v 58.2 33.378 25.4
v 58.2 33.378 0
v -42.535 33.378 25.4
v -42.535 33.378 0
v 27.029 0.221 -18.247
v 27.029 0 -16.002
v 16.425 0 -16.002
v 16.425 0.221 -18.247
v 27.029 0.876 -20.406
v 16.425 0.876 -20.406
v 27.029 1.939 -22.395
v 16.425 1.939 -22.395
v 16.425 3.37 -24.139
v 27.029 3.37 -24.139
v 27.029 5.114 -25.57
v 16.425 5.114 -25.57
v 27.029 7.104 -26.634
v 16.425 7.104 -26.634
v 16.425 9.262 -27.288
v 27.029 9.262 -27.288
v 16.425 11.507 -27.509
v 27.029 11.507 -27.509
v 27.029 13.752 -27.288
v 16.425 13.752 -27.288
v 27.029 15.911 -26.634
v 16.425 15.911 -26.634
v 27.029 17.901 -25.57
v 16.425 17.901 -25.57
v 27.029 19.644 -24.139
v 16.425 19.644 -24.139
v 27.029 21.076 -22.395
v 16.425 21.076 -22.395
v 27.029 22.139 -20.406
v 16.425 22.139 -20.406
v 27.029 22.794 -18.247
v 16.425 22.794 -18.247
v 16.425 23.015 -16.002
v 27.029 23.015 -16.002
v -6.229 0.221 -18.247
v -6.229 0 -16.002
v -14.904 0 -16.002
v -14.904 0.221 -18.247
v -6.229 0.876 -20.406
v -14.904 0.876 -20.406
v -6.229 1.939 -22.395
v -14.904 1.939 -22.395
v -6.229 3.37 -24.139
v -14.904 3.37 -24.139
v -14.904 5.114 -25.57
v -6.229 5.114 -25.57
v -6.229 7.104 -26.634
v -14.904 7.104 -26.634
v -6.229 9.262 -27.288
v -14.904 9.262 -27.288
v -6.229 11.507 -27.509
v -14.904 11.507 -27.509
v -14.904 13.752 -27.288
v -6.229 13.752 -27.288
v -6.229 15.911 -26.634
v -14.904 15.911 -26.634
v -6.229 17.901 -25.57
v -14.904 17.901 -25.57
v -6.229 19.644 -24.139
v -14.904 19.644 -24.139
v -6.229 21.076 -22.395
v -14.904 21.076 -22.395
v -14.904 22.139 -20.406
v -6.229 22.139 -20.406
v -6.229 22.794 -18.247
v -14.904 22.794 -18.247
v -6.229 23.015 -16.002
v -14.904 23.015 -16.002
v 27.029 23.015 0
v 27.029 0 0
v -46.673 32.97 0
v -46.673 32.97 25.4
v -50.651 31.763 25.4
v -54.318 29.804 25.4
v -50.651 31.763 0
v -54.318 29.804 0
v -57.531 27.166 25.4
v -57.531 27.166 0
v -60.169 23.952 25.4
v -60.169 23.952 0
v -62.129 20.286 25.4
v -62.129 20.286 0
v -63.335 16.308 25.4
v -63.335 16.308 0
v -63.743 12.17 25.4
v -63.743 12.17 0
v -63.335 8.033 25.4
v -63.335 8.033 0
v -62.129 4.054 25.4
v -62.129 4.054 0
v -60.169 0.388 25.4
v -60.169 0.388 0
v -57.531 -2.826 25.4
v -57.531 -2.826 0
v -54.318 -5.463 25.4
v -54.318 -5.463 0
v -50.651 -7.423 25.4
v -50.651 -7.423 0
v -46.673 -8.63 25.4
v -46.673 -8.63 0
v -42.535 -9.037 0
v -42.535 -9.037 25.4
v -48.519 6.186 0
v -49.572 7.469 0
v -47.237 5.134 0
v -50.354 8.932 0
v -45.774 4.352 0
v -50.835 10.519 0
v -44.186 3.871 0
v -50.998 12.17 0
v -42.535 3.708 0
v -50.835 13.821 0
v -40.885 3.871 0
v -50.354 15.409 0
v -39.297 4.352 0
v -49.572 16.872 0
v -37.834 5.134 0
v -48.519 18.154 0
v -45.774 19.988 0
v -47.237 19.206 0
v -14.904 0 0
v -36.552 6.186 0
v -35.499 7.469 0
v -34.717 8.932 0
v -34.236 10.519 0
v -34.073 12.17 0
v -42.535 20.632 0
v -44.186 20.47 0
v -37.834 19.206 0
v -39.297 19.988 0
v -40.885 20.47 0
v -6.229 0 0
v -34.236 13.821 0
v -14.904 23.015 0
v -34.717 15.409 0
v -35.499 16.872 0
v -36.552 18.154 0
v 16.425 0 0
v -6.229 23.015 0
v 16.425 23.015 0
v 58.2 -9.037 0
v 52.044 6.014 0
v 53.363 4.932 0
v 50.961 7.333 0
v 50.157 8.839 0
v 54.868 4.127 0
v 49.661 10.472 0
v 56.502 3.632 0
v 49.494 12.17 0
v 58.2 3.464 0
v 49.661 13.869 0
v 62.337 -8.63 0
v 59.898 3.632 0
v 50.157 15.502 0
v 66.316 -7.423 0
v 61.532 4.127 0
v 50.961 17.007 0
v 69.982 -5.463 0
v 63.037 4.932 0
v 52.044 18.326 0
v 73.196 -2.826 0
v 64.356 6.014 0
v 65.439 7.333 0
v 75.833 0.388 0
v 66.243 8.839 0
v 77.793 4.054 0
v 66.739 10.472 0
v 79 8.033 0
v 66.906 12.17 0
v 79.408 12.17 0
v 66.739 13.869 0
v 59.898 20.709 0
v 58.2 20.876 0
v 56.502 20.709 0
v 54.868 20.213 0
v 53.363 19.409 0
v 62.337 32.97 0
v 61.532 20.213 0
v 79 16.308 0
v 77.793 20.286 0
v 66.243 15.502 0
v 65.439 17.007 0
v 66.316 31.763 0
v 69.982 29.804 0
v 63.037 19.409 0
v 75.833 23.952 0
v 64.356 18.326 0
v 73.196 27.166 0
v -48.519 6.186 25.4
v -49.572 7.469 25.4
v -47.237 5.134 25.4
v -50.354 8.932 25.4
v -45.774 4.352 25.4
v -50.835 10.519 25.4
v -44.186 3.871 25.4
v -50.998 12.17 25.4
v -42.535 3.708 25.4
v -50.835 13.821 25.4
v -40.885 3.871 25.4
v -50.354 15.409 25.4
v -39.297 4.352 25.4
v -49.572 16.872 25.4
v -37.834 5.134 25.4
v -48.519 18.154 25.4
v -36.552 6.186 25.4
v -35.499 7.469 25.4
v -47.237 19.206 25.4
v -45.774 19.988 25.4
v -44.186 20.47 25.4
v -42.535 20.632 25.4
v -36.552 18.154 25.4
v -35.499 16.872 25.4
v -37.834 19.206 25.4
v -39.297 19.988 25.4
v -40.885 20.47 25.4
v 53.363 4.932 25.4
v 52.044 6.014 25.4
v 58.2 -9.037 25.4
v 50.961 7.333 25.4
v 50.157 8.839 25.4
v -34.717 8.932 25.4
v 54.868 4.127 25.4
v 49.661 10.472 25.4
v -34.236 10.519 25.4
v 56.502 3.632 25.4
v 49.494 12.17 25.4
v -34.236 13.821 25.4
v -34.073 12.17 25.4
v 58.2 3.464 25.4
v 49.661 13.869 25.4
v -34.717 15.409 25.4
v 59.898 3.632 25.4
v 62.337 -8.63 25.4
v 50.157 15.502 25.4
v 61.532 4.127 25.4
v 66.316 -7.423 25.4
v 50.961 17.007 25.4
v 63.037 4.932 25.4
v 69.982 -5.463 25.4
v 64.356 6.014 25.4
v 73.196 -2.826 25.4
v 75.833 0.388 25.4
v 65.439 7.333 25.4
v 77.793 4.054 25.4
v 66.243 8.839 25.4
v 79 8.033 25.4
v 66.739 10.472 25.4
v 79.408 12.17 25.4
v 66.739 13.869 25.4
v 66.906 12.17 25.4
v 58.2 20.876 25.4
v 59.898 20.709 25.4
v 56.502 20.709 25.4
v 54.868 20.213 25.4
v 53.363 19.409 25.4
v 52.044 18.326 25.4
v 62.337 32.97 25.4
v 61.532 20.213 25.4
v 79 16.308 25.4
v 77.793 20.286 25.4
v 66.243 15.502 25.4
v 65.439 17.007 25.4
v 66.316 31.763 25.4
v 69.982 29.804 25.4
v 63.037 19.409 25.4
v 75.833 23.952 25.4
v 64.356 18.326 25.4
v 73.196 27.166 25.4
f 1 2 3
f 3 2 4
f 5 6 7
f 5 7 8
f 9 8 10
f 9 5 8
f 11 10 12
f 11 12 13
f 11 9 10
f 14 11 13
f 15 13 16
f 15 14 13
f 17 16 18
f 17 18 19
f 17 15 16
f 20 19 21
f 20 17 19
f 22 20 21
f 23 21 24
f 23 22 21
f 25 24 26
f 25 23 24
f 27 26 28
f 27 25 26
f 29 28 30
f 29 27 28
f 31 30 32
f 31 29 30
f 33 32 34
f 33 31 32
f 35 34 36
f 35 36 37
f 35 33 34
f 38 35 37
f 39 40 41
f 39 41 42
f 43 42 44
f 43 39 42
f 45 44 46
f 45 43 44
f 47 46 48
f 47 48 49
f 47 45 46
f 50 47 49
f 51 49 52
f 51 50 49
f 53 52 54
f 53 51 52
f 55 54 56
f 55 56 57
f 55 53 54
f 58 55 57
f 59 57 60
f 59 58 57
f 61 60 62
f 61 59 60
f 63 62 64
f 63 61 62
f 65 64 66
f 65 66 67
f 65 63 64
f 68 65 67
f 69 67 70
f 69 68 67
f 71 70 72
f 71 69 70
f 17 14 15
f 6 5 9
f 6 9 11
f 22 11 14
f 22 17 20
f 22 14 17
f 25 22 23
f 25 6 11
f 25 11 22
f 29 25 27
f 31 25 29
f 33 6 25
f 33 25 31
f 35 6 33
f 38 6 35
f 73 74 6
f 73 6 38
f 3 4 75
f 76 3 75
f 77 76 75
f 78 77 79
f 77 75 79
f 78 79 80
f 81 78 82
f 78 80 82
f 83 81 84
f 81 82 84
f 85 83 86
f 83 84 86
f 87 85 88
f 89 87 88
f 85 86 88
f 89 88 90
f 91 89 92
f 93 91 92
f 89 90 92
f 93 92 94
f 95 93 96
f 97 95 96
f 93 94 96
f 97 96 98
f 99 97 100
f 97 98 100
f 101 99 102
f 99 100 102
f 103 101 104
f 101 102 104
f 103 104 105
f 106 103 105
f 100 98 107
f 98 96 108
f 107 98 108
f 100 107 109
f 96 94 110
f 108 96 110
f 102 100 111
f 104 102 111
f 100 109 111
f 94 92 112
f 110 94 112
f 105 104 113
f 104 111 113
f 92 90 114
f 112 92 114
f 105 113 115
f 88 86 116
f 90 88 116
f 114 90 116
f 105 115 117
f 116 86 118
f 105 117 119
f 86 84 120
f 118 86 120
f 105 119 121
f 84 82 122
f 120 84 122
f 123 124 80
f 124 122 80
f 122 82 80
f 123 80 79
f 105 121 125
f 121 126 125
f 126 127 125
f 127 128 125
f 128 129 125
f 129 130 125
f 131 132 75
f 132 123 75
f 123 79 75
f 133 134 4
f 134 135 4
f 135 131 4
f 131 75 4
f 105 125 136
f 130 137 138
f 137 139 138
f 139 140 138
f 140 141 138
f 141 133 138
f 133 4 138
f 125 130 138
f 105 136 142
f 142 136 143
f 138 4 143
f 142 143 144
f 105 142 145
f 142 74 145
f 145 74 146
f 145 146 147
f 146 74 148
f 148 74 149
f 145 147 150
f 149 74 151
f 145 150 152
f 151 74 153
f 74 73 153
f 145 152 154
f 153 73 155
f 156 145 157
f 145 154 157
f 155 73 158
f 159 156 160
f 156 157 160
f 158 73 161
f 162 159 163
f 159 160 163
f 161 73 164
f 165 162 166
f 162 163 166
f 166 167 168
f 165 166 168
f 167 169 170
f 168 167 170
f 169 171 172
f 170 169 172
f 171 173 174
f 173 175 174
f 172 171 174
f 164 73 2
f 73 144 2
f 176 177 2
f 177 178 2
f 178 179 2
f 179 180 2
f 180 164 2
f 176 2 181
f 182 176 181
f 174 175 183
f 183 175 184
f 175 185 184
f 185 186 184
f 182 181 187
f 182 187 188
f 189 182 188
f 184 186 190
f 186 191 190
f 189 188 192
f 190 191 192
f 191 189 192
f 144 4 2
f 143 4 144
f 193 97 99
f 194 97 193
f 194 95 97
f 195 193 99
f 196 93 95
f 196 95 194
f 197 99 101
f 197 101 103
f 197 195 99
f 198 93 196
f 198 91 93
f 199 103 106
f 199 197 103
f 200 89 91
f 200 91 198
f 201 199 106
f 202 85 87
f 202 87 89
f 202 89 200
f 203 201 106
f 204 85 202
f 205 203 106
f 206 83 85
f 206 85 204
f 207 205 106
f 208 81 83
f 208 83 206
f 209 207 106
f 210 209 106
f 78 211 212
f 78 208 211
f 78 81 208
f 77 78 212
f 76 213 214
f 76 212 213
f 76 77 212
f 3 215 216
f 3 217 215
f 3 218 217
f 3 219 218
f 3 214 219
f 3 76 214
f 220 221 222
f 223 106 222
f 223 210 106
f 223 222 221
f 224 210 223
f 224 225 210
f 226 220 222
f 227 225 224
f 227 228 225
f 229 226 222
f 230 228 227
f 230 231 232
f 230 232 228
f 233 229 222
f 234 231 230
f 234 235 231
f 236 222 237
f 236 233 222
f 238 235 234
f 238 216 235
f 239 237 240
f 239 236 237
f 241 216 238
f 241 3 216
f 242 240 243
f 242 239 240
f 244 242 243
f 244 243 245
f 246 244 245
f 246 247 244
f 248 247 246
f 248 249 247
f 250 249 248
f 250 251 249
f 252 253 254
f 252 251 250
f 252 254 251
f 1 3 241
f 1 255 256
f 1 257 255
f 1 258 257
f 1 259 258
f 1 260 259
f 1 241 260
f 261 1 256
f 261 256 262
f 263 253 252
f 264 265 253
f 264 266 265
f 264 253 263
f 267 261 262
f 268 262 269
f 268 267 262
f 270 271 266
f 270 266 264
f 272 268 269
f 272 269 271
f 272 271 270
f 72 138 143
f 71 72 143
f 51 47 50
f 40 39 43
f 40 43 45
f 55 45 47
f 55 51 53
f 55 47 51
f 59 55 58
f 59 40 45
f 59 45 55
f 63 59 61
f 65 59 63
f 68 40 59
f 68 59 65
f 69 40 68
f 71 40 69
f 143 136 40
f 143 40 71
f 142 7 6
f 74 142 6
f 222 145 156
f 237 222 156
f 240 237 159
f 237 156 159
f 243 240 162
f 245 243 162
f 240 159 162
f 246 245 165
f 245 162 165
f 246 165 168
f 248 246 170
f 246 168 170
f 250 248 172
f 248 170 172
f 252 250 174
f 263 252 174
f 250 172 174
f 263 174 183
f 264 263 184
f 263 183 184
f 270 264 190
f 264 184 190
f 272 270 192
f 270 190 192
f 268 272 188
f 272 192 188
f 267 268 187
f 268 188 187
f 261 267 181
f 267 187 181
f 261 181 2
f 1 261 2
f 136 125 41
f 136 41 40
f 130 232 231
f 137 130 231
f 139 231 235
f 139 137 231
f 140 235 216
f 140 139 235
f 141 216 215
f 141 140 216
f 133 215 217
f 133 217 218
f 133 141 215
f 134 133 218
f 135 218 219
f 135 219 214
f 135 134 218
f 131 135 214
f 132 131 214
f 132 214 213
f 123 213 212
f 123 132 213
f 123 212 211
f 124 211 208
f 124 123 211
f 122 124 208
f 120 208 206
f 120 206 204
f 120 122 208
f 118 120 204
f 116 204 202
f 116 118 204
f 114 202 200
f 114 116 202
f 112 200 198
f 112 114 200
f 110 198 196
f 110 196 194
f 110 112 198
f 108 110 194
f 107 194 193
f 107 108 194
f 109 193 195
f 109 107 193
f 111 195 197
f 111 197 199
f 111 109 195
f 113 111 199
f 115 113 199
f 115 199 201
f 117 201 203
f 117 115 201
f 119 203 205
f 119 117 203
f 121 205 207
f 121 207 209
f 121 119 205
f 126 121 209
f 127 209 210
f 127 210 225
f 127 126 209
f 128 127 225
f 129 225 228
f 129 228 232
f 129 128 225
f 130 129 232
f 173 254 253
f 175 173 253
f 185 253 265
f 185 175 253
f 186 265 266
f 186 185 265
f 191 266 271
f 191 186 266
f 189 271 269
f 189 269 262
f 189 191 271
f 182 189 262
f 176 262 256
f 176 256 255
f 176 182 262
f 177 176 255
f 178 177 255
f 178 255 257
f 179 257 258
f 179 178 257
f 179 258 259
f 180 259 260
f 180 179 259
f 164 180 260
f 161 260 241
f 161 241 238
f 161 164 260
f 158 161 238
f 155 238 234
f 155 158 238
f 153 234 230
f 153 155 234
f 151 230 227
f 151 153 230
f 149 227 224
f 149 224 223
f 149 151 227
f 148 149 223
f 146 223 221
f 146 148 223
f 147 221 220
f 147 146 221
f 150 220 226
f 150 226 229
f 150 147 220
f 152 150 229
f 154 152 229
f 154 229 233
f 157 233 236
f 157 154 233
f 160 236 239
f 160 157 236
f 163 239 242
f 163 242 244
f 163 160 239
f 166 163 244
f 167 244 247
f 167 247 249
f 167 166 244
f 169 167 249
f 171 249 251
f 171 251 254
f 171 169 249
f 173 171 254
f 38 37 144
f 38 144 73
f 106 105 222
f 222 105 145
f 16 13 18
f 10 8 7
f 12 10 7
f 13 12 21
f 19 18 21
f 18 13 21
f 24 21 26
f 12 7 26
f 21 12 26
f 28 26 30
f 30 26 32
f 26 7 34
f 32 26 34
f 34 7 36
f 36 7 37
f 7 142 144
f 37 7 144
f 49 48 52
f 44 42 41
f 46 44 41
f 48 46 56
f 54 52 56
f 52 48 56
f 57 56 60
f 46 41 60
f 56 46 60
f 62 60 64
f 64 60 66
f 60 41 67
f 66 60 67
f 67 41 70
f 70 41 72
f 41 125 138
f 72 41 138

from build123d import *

# Parameters (mm, degrees)
F0_R     = 8.4622870675
F0_R_2   = 8.7058522528
F1_DEPTH = 25.4
F2_W     = 8.6757829413
F2_H     = 23.0149254203
F2_W_2   = 10.6037370861
F3_DEPTH = 16.002
F4_W     = 8.6757829413
F4_H     = 11.5074627101
F6_W     = 10.6037370861
F6_H     = 11.5074627101


with BuildPart() as f1:
    # F0 (on Top) → F1 (new body)
    with BuildSketch(Plane.XY):
        with BuildLine():
            Line((58.2000501454, 33.3776660264), (-42.5354391336, 33.3776660264))
            ThreePointArc((-42.5354391336, 33.3776660264), (-63.7429091148, 12.1701960452), (-42.5354391336, -9.037273936))
            Line((-42.5354391336, -9.037273936), (58.2000501454, -9.037273936))
            ThreePointArc((58.2000501454, -9.037273936), (79.4075201266, 12.1701960452), (58.2000501454, 33.3776660264))
        make_face()
        with Locations((-42.5354391336, 12.1701960452)):
            Circle(F0_R, mode=Mode.SUBTRACT)
        with Locations((58.2000501454, 12.1701960452)):
            Circle(F0_R_2, mode=Mode.SUBTRACT)
    extrude(amount=F1_DEPTH)

    # F2 (on Top) → F3 (join)
    with BuildSketch(Plane.XY):
        with Locations((-10.56643622, 11.5074627101)):
            Rectangle(F2_W, F2_H)
        with Locations((21.726757288, 11.5074627101)):
            Rectangle(F2_W_2, F2_H)
    extrude(amount=-F3_DEPTH)

    # F4 (on face) → F5 (revolve)
    with BuildSketch(Plane(origin=(0, 0, -16.002), x_dir=(1, 0, 0), z_dir=(0, 0, -1))):
        with Locations((-10.56643622, -5.7537313551)):
            Rectangle(F4_W, F4_H)
    revolve(axis=Axis((-10.56643622, 11.5074627101, -16.002), (1, 0, 0)))

    # F6 (on face) → F7 (revolve)
    with BuildSketch(Plane(origin=(0, 0, -16.002), x_dir=(1, 0, 0), z_dir=(0, 0, -1))):
        with Locations((21.726757288, -5.7537313551)):
            Rectangle(F6_W, F6_H)
    revolve(axis=Axis((21.726757288, 11.5074627101, -16.002), (1, 0, 0)))


solid = f1.part
